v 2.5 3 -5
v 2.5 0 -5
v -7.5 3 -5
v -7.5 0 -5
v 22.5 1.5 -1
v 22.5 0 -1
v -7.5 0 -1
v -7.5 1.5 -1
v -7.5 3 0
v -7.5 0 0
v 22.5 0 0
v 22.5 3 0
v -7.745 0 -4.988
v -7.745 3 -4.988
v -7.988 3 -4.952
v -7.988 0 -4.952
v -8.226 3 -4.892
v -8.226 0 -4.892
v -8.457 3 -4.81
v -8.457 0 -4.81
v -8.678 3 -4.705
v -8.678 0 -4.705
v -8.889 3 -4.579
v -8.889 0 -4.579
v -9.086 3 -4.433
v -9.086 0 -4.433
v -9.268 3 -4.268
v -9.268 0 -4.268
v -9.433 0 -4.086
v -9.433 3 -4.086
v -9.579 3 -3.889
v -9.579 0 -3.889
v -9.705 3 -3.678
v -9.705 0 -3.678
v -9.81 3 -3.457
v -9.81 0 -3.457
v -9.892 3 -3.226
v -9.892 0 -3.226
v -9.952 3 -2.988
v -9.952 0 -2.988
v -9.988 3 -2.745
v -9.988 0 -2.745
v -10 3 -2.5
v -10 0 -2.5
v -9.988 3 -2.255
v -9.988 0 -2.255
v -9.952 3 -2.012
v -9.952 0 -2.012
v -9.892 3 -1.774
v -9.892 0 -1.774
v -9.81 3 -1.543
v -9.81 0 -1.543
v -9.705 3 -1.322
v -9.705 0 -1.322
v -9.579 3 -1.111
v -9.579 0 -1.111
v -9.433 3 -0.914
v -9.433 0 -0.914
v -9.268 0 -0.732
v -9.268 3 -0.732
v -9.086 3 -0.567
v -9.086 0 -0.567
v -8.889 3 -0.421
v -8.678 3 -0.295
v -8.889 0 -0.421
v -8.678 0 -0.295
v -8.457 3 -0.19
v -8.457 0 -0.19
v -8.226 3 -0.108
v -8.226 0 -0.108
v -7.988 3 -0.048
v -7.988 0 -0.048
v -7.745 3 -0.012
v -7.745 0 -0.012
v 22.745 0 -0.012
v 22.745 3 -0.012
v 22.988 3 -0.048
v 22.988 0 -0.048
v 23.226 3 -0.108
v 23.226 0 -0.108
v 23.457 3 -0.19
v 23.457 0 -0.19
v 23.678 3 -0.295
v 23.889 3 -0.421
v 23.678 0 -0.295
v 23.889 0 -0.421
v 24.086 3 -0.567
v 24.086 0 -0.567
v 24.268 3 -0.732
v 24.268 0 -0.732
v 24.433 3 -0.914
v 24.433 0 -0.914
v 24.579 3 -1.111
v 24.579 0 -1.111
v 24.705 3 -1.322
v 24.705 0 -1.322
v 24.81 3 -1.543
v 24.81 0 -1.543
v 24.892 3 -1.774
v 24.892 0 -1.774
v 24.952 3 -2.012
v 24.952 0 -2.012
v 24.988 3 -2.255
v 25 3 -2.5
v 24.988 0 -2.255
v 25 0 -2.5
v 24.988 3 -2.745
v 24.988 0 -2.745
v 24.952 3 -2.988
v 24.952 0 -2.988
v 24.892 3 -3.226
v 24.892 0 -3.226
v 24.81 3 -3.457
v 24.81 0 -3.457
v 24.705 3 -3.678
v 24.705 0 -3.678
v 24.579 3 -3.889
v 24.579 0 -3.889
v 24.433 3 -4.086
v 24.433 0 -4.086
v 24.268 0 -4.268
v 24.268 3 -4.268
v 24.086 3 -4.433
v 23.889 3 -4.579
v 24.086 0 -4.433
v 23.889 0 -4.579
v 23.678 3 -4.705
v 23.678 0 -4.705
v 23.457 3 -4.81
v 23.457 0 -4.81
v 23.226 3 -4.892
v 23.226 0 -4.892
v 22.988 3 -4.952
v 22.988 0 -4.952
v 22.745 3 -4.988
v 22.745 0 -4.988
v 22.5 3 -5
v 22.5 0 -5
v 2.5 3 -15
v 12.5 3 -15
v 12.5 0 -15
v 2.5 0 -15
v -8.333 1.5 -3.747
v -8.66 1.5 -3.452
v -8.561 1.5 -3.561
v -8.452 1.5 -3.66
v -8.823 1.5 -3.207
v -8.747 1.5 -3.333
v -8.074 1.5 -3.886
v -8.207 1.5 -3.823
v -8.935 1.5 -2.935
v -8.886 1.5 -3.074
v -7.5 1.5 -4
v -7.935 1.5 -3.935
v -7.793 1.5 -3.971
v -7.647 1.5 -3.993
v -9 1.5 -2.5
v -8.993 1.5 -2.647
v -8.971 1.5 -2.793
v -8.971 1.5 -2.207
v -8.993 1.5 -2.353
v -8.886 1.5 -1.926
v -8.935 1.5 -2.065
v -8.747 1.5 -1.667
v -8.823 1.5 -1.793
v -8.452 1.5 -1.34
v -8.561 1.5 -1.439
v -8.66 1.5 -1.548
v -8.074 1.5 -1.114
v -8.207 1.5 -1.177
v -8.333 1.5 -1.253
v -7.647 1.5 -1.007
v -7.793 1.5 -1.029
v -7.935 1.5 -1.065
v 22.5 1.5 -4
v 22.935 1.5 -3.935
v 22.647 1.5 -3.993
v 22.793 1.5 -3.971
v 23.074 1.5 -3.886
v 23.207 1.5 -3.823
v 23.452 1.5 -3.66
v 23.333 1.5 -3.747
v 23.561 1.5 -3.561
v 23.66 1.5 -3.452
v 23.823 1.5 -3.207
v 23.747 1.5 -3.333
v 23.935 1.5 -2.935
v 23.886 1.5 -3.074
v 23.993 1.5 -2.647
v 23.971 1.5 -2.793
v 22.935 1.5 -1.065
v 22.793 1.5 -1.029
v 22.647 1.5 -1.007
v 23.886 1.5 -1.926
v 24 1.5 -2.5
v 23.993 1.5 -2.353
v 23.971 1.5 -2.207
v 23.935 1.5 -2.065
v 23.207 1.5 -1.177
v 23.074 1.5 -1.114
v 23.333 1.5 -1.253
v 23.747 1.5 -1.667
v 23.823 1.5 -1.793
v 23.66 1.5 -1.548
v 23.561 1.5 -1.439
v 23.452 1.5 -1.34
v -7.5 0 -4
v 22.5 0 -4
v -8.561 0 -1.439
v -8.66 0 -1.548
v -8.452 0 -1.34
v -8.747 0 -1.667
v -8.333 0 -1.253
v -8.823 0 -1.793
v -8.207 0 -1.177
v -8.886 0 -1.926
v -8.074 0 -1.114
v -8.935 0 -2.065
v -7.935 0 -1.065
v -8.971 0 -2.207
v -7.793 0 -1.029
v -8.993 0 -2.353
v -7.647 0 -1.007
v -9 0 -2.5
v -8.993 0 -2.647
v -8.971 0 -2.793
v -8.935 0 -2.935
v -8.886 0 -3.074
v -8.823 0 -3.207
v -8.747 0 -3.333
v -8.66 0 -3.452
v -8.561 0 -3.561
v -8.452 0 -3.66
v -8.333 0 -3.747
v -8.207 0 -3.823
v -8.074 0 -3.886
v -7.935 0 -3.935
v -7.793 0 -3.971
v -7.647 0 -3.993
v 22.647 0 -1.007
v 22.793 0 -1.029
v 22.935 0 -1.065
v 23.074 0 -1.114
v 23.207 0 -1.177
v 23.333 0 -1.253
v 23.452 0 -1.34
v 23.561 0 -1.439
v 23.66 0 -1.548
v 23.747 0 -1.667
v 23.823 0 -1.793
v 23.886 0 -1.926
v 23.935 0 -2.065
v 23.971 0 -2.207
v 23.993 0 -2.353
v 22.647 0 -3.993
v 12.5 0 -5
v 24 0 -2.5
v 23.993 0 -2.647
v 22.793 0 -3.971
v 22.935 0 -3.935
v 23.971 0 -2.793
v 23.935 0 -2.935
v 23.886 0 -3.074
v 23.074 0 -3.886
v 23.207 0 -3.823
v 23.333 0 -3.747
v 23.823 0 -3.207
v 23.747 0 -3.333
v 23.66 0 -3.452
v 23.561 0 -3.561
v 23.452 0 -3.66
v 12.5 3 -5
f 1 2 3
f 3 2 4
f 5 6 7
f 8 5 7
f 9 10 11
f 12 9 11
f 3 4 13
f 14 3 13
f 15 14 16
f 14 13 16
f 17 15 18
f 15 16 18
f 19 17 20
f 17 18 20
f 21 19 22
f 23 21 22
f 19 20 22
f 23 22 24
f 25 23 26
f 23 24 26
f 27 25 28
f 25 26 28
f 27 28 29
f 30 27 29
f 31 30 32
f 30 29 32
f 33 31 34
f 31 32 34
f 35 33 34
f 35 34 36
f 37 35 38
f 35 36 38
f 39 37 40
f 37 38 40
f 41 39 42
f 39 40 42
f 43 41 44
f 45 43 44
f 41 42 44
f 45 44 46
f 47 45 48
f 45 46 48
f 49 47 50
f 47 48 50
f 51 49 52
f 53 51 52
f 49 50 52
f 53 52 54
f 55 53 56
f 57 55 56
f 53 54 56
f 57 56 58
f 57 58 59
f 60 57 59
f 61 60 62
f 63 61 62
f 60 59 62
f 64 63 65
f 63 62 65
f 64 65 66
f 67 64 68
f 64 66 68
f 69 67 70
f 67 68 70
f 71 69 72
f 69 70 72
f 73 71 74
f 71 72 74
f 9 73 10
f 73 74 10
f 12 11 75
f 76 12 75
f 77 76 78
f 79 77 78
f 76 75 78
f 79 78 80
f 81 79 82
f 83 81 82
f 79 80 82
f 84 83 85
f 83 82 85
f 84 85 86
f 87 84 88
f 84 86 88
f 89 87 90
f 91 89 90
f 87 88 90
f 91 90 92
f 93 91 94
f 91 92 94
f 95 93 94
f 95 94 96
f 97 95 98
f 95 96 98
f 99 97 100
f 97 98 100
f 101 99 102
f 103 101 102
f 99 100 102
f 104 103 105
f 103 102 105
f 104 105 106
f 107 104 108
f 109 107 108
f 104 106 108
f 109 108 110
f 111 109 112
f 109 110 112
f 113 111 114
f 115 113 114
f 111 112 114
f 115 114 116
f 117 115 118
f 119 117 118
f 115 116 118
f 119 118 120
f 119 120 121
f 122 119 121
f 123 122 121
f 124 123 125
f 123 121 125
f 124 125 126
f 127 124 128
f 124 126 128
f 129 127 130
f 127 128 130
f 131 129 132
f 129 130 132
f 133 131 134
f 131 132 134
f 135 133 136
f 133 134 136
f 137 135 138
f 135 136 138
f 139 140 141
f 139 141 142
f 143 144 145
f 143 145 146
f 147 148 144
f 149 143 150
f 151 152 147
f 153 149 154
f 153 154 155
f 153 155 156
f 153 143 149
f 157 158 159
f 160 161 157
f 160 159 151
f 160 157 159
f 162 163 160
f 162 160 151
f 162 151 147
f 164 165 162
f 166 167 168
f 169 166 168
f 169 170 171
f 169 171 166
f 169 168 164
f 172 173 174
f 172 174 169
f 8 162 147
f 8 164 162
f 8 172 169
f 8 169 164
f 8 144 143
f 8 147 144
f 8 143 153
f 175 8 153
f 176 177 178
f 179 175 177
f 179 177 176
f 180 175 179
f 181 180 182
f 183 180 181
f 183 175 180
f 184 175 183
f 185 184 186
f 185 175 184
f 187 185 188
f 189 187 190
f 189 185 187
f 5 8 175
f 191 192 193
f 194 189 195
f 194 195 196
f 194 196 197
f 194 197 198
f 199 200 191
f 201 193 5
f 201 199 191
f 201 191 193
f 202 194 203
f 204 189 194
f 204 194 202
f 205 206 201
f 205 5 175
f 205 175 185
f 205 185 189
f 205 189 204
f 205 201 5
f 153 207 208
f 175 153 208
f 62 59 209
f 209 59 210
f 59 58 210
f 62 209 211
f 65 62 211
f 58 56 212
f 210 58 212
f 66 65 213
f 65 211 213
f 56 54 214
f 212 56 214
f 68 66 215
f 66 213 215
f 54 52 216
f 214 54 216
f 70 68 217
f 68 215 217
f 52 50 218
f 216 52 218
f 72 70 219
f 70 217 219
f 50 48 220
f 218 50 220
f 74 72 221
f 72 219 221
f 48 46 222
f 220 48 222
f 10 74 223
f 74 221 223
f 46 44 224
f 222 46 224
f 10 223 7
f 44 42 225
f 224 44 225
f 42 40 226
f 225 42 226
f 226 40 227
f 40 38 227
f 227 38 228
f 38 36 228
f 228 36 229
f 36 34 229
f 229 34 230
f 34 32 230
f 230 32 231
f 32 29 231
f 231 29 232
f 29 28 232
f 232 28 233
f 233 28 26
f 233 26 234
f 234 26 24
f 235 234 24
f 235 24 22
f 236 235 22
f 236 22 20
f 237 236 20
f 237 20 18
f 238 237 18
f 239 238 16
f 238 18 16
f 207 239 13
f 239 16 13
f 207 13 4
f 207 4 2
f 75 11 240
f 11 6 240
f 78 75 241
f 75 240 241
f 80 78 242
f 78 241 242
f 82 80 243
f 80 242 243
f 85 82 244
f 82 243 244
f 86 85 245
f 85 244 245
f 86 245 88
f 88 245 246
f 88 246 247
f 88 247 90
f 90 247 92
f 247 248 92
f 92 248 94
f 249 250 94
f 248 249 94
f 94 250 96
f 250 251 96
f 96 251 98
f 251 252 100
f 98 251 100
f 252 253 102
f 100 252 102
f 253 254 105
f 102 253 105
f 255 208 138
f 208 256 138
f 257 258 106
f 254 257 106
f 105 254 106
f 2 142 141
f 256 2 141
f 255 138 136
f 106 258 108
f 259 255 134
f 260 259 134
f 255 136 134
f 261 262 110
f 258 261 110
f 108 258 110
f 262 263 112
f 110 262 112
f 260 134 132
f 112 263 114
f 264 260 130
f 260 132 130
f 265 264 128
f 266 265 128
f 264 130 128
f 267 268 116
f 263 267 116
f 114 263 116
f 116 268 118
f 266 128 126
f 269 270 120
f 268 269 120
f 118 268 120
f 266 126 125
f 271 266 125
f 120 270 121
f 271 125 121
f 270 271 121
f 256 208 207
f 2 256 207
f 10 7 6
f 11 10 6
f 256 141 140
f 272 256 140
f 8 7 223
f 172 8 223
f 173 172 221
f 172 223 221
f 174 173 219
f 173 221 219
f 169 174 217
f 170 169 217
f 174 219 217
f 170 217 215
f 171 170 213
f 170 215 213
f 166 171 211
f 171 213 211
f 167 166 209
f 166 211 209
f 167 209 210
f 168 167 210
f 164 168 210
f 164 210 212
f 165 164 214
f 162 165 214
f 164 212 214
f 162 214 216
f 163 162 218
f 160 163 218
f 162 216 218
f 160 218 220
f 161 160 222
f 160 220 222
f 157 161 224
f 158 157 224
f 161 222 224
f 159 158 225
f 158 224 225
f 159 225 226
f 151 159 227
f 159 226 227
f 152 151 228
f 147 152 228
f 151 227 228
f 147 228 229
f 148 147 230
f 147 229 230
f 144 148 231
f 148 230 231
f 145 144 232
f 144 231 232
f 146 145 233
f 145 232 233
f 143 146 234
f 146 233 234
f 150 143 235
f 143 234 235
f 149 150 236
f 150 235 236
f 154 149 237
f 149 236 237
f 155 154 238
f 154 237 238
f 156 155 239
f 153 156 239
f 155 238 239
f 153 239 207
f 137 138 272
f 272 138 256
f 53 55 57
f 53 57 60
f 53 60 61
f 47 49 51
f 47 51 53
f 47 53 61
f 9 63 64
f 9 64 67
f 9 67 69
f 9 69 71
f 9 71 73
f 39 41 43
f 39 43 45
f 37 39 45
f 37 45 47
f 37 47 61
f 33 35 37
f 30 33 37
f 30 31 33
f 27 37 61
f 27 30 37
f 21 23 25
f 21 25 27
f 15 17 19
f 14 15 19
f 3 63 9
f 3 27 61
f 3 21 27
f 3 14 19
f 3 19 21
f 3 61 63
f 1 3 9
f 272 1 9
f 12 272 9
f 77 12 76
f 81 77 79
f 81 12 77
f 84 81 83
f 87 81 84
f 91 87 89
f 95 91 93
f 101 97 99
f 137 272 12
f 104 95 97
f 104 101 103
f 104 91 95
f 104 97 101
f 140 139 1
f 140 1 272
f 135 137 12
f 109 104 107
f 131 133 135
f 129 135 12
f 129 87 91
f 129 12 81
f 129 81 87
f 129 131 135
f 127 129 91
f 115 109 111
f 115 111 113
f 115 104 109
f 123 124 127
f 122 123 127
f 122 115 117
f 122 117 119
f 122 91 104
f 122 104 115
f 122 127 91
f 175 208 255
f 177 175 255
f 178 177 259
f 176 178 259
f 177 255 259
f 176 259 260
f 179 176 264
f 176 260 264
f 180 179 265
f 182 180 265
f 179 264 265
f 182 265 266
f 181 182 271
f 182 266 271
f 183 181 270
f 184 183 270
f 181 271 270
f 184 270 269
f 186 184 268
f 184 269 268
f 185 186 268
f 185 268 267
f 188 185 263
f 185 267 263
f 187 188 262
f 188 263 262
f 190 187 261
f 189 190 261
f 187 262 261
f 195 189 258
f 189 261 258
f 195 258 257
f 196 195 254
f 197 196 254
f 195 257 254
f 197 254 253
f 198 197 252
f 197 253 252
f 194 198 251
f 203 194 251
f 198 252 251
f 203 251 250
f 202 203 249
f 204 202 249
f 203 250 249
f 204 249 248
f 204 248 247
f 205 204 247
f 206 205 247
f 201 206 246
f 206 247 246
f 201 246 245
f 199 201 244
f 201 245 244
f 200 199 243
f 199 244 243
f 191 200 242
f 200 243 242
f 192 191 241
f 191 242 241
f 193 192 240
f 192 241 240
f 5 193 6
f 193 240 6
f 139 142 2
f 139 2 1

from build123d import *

# Parameters (mm, degrees)
BOSS_EXTRUDE1_DEPTH = 3
CUT_EXTRUDE1_DEPTH  = 1.5
SKETCH4_W           = 10
SKETCH4_H           = 3
BOSS_EXTRUDE3_DEPTH = 10


with BuildPart() as part:
    # Sketch1 → Boss-Extrude1 (new body)
    with BuildSketch(Plane(origin=(0, 0, 0), x_dir=(1, 0, 0), z_dir=(0, 1, 0))):
        with BuildLine():
            Line((-7.499999551, 0), (22.5, 0))
            ThreePointArc((22.5, 0), (25, 2.5), (22.5, 5))
            Line((22.5, 5), (-7.5, 5))
            ThreePointArc((-7.5, 5), (-10, 2.499999775), (-7.499999551, 0))
        make_face()
    extrude(amount=BOSS_EXTRUDE1_DEPTH)

    # Sketch2 → Cut-Extrude1 (cut)
    with BuildSketch(Plane.XZ):
        with BuildLine():
            Line((-7.5, -4), (22.5, -4))
            ThreePointArc((22.5, -4), (24, -2.5), (22.5, -1))
            Line((22.5, -1), (-7.49999973, -1))
            ThreePointArc((-7.49999973, -1), (-9, -2.499999865), (-7.5, -4))
        make_face()
    extrude(amount=-CUT_EXTRUDE1_DEPTH, mode=Mode.SUBTRACT)

    # Sketch4 → Boss-Extrude3 (add)
    with BuildSketch(Plane(origin=(0, 0, -5), x_dir=(-1, 0, 0), z_dir=(0, 0, -1))):
        with Locations((-7.5, 1.5)):
            Rectangle(SKETCH4_W, SKETCH4_H)
    extrude(amount=BOSS_EXTRUDE3_DEPTH)


solid = part.part
